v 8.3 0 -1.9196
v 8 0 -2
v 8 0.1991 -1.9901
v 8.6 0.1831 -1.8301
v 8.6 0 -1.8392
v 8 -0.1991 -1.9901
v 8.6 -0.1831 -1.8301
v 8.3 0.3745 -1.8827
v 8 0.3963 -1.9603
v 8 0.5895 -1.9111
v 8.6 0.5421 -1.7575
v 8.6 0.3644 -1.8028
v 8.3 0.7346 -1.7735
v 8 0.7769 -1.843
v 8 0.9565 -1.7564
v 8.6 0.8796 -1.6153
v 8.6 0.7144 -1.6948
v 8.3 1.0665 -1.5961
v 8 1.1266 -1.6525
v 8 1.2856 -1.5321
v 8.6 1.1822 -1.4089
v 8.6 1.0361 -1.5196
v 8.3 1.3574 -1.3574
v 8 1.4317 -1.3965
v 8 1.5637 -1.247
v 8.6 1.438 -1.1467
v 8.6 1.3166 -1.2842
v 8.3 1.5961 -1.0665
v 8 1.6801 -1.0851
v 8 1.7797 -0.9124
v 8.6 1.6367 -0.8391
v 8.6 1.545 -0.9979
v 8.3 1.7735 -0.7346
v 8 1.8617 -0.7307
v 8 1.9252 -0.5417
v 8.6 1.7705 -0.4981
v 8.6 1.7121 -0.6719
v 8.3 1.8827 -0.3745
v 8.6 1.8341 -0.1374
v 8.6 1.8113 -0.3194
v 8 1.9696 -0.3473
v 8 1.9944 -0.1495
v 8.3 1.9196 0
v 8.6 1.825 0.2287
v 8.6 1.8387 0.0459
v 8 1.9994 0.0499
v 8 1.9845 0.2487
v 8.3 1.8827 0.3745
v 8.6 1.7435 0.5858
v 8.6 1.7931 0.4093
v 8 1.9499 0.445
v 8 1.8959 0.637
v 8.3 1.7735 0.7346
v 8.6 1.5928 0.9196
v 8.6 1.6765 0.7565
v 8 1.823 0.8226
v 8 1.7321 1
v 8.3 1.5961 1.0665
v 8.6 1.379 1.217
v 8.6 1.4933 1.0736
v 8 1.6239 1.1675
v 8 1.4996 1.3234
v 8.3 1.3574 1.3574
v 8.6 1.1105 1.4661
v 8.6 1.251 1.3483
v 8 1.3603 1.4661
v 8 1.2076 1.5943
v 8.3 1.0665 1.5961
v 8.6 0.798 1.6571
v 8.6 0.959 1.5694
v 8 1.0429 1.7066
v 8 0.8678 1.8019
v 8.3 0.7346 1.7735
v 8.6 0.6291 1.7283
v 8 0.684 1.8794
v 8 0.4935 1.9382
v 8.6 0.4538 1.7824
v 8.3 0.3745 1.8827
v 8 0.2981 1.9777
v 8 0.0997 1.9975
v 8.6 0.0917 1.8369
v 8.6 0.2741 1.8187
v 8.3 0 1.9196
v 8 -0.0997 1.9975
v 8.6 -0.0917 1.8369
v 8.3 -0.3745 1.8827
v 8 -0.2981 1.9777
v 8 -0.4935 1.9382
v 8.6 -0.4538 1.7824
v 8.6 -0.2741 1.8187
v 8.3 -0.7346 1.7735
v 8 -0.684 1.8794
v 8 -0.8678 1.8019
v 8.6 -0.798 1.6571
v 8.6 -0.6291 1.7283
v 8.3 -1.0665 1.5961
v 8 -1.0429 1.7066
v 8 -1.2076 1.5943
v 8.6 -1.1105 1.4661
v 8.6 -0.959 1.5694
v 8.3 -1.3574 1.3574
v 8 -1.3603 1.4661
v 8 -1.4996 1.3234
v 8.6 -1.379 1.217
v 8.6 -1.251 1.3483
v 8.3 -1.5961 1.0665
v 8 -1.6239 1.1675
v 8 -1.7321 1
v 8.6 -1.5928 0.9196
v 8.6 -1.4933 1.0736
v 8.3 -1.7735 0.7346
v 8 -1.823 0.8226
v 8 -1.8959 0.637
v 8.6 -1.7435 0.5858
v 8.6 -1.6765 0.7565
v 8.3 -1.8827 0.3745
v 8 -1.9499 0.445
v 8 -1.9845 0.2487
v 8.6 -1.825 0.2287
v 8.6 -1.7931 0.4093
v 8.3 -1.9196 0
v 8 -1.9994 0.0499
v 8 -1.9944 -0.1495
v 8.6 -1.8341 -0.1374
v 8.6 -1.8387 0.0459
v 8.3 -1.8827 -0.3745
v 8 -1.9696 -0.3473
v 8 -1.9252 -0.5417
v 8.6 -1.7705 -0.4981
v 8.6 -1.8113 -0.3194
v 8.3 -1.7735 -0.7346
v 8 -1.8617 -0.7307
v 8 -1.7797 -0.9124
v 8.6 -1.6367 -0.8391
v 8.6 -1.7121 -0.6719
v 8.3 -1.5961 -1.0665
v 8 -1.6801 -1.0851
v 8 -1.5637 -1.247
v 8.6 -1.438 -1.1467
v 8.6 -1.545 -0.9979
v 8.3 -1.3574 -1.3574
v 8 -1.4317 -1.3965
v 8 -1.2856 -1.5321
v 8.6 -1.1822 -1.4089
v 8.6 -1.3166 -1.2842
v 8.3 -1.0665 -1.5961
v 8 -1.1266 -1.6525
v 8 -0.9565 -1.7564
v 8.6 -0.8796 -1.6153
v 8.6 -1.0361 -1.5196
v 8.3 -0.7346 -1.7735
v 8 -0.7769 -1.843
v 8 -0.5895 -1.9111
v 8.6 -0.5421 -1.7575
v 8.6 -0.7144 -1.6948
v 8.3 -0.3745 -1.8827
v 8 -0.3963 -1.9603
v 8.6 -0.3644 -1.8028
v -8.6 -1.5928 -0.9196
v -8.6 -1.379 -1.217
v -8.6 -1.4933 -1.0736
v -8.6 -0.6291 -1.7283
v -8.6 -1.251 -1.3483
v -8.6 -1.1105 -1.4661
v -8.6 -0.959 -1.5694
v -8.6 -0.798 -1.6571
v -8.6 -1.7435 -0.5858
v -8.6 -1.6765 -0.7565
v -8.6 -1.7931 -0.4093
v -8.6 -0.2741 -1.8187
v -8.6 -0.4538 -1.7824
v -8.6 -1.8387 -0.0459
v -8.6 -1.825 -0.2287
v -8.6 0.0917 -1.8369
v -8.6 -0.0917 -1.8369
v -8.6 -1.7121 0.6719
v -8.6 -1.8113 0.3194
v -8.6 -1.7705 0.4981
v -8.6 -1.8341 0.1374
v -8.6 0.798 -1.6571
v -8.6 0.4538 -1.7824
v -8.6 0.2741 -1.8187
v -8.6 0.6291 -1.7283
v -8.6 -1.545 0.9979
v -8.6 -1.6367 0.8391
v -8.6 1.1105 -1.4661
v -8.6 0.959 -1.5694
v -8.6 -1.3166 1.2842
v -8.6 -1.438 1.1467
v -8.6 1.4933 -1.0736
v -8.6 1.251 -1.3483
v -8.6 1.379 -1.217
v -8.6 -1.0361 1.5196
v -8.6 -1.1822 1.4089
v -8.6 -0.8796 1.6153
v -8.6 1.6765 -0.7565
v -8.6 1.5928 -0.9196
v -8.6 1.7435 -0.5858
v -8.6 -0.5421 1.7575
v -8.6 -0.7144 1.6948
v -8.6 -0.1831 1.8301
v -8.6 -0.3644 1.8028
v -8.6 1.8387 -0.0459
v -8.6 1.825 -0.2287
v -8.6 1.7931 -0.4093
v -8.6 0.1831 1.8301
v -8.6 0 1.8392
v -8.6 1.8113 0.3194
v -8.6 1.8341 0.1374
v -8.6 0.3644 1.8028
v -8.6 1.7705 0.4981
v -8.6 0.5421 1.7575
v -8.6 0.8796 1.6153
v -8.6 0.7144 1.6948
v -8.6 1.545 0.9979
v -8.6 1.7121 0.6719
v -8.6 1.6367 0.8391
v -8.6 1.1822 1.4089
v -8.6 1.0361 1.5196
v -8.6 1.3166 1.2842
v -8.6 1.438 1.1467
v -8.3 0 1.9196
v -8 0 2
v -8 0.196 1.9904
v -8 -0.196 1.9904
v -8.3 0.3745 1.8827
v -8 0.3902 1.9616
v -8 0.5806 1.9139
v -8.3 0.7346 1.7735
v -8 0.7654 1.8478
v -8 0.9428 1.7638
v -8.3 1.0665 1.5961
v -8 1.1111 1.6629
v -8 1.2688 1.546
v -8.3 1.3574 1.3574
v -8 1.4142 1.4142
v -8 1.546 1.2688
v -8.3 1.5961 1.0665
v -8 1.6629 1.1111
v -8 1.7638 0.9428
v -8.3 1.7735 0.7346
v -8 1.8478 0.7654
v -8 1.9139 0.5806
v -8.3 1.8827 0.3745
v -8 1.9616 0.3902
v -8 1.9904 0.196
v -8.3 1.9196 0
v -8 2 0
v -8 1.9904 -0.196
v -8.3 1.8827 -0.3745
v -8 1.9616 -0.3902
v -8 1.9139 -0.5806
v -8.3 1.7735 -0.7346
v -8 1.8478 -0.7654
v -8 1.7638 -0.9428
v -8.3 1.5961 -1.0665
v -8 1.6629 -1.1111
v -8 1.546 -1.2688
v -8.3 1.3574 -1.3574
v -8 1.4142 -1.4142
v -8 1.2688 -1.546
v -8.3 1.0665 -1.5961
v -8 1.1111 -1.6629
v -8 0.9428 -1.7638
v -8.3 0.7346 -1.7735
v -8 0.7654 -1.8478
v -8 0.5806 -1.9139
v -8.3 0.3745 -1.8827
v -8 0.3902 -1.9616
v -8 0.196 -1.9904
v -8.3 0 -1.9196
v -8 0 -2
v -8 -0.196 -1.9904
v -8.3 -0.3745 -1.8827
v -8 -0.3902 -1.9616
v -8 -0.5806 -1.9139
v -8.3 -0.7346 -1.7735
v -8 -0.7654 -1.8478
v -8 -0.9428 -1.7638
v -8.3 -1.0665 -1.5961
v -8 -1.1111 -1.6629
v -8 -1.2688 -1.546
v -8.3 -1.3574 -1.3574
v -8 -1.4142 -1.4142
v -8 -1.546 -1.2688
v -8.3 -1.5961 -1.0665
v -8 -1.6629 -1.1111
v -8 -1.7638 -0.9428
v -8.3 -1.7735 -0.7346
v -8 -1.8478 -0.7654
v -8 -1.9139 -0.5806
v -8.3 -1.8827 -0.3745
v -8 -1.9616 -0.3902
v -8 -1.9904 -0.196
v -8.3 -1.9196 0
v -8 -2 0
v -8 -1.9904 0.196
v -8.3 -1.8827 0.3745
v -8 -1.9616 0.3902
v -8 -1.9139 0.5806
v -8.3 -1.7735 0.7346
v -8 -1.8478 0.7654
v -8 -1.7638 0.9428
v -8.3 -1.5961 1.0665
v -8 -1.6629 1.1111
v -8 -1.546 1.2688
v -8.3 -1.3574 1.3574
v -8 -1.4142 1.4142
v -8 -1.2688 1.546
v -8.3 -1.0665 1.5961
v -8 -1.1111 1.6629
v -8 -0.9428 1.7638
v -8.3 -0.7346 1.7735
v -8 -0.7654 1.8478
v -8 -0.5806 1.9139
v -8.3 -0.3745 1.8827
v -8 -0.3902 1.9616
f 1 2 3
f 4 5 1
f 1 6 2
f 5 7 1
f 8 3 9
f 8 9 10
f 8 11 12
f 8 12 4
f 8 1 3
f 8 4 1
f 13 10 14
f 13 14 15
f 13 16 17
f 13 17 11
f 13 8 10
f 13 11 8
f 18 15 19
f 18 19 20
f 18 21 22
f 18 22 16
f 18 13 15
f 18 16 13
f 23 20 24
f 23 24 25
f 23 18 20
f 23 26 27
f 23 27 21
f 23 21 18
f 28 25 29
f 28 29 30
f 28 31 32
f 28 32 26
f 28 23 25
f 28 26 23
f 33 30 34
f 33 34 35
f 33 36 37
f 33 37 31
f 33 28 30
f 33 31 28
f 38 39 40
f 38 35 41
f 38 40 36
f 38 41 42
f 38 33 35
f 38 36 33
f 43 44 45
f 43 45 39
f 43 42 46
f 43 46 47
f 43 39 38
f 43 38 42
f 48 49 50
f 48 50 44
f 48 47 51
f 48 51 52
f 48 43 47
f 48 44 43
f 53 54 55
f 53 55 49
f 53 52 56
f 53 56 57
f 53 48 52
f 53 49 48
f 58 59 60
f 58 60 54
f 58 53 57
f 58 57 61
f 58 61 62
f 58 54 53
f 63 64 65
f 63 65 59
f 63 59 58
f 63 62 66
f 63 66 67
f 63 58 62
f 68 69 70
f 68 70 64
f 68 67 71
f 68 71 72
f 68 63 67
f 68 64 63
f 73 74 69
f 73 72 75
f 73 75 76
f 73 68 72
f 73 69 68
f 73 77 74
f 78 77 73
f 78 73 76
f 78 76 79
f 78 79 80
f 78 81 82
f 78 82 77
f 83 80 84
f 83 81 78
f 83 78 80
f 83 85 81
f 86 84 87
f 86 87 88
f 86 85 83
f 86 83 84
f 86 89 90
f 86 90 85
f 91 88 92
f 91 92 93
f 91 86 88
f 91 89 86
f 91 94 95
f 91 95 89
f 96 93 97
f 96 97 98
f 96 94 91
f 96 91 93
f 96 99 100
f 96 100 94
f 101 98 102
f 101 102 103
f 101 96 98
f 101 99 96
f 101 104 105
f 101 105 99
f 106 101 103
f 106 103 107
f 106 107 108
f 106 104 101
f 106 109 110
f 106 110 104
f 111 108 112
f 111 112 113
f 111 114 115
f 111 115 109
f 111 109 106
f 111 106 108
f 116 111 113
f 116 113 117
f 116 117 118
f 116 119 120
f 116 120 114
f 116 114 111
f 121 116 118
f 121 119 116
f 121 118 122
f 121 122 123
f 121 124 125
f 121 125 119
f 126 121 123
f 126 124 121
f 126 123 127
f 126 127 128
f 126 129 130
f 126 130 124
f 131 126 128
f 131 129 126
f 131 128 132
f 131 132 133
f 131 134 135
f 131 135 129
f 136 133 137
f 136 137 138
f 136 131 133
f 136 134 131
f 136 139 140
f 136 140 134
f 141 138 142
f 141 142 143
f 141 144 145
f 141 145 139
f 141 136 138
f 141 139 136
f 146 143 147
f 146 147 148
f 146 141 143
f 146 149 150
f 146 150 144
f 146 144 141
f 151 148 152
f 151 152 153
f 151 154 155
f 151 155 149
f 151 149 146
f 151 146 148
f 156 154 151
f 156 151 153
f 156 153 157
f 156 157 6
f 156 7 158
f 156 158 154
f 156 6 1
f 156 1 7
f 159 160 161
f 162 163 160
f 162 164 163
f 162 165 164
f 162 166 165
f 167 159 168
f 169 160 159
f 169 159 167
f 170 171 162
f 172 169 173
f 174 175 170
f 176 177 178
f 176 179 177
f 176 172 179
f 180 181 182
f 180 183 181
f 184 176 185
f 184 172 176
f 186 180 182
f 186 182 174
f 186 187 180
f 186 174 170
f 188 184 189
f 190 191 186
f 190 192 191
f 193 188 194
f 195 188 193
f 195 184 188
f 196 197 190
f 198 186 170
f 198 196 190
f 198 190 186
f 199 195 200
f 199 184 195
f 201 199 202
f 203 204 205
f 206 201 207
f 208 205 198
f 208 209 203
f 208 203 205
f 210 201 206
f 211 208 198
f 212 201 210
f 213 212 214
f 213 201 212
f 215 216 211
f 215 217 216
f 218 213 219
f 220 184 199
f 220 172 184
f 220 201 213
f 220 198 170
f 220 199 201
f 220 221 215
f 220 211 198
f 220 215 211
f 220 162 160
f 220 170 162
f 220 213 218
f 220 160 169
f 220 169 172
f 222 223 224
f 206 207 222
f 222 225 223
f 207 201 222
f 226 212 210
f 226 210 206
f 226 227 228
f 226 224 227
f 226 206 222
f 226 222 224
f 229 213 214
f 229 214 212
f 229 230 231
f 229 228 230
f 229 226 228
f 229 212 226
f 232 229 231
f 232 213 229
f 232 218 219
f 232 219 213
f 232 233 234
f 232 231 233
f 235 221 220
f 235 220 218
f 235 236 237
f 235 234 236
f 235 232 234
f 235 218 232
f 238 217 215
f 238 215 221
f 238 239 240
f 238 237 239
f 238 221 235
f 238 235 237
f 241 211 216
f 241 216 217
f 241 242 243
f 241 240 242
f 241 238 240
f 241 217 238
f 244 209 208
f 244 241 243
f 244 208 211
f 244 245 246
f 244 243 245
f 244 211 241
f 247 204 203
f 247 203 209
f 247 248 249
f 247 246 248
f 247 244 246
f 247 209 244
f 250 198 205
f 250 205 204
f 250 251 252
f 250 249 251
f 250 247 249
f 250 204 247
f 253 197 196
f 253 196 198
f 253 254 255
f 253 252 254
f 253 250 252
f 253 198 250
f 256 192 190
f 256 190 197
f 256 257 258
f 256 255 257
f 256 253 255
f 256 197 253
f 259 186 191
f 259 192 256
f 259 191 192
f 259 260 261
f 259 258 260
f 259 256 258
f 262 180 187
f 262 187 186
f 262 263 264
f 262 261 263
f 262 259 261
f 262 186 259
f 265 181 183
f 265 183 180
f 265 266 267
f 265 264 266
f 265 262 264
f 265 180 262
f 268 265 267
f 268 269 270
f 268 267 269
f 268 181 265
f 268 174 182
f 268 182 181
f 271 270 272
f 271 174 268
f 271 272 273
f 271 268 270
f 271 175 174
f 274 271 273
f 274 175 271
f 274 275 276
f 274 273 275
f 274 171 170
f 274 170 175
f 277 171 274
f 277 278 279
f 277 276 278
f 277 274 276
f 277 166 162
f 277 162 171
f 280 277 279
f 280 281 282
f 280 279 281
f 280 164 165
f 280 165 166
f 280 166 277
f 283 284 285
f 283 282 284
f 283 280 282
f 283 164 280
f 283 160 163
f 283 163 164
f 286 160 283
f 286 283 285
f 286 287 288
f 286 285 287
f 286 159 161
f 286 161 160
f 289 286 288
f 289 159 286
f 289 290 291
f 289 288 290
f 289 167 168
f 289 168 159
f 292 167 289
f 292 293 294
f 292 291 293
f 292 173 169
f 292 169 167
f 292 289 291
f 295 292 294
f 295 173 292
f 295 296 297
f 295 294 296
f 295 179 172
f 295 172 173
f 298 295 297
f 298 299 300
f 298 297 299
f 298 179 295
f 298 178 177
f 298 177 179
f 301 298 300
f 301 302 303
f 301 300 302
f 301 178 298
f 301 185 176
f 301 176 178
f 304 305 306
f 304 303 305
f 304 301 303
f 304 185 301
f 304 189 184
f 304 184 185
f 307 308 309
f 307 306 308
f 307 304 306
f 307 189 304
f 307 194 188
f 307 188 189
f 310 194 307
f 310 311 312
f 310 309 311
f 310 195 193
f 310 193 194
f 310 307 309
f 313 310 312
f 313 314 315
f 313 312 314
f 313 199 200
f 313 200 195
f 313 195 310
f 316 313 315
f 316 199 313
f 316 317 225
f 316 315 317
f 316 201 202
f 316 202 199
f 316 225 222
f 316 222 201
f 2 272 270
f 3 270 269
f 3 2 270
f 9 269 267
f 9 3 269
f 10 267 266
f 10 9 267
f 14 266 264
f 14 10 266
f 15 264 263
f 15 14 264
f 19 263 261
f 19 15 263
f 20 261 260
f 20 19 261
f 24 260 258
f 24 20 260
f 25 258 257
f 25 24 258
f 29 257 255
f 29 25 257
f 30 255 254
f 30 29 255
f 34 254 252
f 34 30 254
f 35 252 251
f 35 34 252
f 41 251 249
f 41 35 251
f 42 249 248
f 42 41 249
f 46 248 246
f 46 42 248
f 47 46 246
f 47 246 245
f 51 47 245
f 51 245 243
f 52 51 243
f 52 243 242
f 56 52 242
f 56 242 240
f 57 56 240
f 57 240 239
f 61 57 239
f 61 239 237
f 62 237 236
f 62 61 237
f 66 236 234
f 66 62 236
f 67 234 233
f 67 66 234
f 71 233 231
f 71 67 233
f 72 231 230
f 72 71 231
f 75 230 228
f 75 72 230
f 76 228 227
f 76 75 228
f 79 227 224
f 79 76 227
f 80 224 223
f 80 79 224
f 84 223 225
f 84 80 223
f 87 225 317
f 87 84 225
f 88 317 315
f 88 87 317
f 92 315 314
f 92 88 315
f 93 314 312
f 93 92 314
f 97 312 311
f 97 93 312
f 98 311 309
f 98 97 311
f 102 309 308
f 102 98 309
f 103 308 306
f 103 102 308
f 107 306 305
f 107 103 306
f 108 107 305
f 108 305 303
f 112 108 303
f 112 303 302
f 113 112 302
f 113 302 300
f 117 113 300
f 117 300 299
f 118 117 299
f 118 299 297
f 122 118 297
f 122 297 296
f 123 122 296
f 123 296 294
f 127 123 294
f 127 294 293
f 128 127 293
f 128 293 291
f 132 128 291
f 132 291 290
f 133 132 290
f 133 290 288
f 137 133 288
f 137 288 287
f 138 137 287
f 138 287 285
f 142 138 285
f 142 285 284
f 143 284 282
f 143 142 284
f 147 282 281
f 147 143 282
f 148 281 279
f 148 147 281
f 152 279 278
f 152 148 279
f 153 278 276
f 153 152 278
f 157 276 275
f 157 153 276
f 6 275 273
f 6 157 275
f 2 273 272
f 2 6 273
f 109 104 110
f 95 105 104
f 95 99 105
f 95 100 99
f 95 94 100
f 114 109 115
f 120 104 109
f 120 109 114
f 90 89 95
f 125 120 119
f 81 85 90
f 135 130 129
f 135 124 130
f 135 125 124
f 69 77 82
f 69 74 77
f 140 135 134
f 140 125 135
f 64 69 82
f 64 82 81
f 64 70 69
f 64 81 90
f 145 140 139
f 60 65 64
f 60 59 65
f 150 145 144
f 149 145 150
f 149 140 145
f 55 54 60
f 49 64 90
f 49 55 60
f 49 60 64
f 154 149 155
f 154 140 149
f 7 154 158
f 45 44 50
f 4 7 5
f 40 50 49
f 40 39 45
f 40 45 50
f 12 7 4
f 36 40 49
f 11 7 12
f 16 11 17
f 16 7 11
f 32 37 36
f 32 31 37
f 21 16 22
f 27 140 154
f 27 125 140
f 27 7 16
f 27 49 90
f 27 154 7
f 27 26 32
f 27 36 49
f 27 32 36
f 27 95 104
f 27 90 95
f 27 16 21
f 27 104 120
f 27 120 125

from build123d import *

# Parameters (mm, degrees)
SKETCH2_R           = 2
EXTRUDE1_DEPTH      = 8
EXTRUDE1_DEPTH_BACK = 8
SKETCH3_R           = 2
EXTRUDE2_DEPTH      = 0.6
EXTRUDE2_TAPER      = 15
SKETCH4_R           = 2
EXTRUDE3_DEPTH      = 0.6
EXTRUDE3_TAPER      = 15


with BuildPart() as part:
    # Sketch2 → Extrude1 (new body, two sides)
    with BuildSketch(Plane(origin=(0, 0, 0), x_dir=(0, 0, -1), z_dir=(1, 0, 0))) as extrude1_sk:
        Circle(SKETCH2_R)
    extrude(amount=EXTRUDE1_DEPTH)
    extrude(extrude1_sk.sketch, amount=-EXTRUDE1_DEPTH_BACK)

    # Sketch3 → Extrude2 (add)
    with BuildSketch(Plane(origin=(8, 0, 0), x_dir=(0, 0, -1), z_dir=(1, 0, 0))):
        Circle(SKETCH3_R)
    extrude(amount=EXTRUDE2_DEPTH, taper=EXTRUDE2_TAPER)

    # Sketch4 → Extrude3 (add)
    with BuildSketch(Plane.ZY.offset(8)):
        Circle(SKETCH4_R)
    extrude(amount=EXTRUDE3_DEPTH, taper=EXTRUDE3_TAPER)


solid = part.part
